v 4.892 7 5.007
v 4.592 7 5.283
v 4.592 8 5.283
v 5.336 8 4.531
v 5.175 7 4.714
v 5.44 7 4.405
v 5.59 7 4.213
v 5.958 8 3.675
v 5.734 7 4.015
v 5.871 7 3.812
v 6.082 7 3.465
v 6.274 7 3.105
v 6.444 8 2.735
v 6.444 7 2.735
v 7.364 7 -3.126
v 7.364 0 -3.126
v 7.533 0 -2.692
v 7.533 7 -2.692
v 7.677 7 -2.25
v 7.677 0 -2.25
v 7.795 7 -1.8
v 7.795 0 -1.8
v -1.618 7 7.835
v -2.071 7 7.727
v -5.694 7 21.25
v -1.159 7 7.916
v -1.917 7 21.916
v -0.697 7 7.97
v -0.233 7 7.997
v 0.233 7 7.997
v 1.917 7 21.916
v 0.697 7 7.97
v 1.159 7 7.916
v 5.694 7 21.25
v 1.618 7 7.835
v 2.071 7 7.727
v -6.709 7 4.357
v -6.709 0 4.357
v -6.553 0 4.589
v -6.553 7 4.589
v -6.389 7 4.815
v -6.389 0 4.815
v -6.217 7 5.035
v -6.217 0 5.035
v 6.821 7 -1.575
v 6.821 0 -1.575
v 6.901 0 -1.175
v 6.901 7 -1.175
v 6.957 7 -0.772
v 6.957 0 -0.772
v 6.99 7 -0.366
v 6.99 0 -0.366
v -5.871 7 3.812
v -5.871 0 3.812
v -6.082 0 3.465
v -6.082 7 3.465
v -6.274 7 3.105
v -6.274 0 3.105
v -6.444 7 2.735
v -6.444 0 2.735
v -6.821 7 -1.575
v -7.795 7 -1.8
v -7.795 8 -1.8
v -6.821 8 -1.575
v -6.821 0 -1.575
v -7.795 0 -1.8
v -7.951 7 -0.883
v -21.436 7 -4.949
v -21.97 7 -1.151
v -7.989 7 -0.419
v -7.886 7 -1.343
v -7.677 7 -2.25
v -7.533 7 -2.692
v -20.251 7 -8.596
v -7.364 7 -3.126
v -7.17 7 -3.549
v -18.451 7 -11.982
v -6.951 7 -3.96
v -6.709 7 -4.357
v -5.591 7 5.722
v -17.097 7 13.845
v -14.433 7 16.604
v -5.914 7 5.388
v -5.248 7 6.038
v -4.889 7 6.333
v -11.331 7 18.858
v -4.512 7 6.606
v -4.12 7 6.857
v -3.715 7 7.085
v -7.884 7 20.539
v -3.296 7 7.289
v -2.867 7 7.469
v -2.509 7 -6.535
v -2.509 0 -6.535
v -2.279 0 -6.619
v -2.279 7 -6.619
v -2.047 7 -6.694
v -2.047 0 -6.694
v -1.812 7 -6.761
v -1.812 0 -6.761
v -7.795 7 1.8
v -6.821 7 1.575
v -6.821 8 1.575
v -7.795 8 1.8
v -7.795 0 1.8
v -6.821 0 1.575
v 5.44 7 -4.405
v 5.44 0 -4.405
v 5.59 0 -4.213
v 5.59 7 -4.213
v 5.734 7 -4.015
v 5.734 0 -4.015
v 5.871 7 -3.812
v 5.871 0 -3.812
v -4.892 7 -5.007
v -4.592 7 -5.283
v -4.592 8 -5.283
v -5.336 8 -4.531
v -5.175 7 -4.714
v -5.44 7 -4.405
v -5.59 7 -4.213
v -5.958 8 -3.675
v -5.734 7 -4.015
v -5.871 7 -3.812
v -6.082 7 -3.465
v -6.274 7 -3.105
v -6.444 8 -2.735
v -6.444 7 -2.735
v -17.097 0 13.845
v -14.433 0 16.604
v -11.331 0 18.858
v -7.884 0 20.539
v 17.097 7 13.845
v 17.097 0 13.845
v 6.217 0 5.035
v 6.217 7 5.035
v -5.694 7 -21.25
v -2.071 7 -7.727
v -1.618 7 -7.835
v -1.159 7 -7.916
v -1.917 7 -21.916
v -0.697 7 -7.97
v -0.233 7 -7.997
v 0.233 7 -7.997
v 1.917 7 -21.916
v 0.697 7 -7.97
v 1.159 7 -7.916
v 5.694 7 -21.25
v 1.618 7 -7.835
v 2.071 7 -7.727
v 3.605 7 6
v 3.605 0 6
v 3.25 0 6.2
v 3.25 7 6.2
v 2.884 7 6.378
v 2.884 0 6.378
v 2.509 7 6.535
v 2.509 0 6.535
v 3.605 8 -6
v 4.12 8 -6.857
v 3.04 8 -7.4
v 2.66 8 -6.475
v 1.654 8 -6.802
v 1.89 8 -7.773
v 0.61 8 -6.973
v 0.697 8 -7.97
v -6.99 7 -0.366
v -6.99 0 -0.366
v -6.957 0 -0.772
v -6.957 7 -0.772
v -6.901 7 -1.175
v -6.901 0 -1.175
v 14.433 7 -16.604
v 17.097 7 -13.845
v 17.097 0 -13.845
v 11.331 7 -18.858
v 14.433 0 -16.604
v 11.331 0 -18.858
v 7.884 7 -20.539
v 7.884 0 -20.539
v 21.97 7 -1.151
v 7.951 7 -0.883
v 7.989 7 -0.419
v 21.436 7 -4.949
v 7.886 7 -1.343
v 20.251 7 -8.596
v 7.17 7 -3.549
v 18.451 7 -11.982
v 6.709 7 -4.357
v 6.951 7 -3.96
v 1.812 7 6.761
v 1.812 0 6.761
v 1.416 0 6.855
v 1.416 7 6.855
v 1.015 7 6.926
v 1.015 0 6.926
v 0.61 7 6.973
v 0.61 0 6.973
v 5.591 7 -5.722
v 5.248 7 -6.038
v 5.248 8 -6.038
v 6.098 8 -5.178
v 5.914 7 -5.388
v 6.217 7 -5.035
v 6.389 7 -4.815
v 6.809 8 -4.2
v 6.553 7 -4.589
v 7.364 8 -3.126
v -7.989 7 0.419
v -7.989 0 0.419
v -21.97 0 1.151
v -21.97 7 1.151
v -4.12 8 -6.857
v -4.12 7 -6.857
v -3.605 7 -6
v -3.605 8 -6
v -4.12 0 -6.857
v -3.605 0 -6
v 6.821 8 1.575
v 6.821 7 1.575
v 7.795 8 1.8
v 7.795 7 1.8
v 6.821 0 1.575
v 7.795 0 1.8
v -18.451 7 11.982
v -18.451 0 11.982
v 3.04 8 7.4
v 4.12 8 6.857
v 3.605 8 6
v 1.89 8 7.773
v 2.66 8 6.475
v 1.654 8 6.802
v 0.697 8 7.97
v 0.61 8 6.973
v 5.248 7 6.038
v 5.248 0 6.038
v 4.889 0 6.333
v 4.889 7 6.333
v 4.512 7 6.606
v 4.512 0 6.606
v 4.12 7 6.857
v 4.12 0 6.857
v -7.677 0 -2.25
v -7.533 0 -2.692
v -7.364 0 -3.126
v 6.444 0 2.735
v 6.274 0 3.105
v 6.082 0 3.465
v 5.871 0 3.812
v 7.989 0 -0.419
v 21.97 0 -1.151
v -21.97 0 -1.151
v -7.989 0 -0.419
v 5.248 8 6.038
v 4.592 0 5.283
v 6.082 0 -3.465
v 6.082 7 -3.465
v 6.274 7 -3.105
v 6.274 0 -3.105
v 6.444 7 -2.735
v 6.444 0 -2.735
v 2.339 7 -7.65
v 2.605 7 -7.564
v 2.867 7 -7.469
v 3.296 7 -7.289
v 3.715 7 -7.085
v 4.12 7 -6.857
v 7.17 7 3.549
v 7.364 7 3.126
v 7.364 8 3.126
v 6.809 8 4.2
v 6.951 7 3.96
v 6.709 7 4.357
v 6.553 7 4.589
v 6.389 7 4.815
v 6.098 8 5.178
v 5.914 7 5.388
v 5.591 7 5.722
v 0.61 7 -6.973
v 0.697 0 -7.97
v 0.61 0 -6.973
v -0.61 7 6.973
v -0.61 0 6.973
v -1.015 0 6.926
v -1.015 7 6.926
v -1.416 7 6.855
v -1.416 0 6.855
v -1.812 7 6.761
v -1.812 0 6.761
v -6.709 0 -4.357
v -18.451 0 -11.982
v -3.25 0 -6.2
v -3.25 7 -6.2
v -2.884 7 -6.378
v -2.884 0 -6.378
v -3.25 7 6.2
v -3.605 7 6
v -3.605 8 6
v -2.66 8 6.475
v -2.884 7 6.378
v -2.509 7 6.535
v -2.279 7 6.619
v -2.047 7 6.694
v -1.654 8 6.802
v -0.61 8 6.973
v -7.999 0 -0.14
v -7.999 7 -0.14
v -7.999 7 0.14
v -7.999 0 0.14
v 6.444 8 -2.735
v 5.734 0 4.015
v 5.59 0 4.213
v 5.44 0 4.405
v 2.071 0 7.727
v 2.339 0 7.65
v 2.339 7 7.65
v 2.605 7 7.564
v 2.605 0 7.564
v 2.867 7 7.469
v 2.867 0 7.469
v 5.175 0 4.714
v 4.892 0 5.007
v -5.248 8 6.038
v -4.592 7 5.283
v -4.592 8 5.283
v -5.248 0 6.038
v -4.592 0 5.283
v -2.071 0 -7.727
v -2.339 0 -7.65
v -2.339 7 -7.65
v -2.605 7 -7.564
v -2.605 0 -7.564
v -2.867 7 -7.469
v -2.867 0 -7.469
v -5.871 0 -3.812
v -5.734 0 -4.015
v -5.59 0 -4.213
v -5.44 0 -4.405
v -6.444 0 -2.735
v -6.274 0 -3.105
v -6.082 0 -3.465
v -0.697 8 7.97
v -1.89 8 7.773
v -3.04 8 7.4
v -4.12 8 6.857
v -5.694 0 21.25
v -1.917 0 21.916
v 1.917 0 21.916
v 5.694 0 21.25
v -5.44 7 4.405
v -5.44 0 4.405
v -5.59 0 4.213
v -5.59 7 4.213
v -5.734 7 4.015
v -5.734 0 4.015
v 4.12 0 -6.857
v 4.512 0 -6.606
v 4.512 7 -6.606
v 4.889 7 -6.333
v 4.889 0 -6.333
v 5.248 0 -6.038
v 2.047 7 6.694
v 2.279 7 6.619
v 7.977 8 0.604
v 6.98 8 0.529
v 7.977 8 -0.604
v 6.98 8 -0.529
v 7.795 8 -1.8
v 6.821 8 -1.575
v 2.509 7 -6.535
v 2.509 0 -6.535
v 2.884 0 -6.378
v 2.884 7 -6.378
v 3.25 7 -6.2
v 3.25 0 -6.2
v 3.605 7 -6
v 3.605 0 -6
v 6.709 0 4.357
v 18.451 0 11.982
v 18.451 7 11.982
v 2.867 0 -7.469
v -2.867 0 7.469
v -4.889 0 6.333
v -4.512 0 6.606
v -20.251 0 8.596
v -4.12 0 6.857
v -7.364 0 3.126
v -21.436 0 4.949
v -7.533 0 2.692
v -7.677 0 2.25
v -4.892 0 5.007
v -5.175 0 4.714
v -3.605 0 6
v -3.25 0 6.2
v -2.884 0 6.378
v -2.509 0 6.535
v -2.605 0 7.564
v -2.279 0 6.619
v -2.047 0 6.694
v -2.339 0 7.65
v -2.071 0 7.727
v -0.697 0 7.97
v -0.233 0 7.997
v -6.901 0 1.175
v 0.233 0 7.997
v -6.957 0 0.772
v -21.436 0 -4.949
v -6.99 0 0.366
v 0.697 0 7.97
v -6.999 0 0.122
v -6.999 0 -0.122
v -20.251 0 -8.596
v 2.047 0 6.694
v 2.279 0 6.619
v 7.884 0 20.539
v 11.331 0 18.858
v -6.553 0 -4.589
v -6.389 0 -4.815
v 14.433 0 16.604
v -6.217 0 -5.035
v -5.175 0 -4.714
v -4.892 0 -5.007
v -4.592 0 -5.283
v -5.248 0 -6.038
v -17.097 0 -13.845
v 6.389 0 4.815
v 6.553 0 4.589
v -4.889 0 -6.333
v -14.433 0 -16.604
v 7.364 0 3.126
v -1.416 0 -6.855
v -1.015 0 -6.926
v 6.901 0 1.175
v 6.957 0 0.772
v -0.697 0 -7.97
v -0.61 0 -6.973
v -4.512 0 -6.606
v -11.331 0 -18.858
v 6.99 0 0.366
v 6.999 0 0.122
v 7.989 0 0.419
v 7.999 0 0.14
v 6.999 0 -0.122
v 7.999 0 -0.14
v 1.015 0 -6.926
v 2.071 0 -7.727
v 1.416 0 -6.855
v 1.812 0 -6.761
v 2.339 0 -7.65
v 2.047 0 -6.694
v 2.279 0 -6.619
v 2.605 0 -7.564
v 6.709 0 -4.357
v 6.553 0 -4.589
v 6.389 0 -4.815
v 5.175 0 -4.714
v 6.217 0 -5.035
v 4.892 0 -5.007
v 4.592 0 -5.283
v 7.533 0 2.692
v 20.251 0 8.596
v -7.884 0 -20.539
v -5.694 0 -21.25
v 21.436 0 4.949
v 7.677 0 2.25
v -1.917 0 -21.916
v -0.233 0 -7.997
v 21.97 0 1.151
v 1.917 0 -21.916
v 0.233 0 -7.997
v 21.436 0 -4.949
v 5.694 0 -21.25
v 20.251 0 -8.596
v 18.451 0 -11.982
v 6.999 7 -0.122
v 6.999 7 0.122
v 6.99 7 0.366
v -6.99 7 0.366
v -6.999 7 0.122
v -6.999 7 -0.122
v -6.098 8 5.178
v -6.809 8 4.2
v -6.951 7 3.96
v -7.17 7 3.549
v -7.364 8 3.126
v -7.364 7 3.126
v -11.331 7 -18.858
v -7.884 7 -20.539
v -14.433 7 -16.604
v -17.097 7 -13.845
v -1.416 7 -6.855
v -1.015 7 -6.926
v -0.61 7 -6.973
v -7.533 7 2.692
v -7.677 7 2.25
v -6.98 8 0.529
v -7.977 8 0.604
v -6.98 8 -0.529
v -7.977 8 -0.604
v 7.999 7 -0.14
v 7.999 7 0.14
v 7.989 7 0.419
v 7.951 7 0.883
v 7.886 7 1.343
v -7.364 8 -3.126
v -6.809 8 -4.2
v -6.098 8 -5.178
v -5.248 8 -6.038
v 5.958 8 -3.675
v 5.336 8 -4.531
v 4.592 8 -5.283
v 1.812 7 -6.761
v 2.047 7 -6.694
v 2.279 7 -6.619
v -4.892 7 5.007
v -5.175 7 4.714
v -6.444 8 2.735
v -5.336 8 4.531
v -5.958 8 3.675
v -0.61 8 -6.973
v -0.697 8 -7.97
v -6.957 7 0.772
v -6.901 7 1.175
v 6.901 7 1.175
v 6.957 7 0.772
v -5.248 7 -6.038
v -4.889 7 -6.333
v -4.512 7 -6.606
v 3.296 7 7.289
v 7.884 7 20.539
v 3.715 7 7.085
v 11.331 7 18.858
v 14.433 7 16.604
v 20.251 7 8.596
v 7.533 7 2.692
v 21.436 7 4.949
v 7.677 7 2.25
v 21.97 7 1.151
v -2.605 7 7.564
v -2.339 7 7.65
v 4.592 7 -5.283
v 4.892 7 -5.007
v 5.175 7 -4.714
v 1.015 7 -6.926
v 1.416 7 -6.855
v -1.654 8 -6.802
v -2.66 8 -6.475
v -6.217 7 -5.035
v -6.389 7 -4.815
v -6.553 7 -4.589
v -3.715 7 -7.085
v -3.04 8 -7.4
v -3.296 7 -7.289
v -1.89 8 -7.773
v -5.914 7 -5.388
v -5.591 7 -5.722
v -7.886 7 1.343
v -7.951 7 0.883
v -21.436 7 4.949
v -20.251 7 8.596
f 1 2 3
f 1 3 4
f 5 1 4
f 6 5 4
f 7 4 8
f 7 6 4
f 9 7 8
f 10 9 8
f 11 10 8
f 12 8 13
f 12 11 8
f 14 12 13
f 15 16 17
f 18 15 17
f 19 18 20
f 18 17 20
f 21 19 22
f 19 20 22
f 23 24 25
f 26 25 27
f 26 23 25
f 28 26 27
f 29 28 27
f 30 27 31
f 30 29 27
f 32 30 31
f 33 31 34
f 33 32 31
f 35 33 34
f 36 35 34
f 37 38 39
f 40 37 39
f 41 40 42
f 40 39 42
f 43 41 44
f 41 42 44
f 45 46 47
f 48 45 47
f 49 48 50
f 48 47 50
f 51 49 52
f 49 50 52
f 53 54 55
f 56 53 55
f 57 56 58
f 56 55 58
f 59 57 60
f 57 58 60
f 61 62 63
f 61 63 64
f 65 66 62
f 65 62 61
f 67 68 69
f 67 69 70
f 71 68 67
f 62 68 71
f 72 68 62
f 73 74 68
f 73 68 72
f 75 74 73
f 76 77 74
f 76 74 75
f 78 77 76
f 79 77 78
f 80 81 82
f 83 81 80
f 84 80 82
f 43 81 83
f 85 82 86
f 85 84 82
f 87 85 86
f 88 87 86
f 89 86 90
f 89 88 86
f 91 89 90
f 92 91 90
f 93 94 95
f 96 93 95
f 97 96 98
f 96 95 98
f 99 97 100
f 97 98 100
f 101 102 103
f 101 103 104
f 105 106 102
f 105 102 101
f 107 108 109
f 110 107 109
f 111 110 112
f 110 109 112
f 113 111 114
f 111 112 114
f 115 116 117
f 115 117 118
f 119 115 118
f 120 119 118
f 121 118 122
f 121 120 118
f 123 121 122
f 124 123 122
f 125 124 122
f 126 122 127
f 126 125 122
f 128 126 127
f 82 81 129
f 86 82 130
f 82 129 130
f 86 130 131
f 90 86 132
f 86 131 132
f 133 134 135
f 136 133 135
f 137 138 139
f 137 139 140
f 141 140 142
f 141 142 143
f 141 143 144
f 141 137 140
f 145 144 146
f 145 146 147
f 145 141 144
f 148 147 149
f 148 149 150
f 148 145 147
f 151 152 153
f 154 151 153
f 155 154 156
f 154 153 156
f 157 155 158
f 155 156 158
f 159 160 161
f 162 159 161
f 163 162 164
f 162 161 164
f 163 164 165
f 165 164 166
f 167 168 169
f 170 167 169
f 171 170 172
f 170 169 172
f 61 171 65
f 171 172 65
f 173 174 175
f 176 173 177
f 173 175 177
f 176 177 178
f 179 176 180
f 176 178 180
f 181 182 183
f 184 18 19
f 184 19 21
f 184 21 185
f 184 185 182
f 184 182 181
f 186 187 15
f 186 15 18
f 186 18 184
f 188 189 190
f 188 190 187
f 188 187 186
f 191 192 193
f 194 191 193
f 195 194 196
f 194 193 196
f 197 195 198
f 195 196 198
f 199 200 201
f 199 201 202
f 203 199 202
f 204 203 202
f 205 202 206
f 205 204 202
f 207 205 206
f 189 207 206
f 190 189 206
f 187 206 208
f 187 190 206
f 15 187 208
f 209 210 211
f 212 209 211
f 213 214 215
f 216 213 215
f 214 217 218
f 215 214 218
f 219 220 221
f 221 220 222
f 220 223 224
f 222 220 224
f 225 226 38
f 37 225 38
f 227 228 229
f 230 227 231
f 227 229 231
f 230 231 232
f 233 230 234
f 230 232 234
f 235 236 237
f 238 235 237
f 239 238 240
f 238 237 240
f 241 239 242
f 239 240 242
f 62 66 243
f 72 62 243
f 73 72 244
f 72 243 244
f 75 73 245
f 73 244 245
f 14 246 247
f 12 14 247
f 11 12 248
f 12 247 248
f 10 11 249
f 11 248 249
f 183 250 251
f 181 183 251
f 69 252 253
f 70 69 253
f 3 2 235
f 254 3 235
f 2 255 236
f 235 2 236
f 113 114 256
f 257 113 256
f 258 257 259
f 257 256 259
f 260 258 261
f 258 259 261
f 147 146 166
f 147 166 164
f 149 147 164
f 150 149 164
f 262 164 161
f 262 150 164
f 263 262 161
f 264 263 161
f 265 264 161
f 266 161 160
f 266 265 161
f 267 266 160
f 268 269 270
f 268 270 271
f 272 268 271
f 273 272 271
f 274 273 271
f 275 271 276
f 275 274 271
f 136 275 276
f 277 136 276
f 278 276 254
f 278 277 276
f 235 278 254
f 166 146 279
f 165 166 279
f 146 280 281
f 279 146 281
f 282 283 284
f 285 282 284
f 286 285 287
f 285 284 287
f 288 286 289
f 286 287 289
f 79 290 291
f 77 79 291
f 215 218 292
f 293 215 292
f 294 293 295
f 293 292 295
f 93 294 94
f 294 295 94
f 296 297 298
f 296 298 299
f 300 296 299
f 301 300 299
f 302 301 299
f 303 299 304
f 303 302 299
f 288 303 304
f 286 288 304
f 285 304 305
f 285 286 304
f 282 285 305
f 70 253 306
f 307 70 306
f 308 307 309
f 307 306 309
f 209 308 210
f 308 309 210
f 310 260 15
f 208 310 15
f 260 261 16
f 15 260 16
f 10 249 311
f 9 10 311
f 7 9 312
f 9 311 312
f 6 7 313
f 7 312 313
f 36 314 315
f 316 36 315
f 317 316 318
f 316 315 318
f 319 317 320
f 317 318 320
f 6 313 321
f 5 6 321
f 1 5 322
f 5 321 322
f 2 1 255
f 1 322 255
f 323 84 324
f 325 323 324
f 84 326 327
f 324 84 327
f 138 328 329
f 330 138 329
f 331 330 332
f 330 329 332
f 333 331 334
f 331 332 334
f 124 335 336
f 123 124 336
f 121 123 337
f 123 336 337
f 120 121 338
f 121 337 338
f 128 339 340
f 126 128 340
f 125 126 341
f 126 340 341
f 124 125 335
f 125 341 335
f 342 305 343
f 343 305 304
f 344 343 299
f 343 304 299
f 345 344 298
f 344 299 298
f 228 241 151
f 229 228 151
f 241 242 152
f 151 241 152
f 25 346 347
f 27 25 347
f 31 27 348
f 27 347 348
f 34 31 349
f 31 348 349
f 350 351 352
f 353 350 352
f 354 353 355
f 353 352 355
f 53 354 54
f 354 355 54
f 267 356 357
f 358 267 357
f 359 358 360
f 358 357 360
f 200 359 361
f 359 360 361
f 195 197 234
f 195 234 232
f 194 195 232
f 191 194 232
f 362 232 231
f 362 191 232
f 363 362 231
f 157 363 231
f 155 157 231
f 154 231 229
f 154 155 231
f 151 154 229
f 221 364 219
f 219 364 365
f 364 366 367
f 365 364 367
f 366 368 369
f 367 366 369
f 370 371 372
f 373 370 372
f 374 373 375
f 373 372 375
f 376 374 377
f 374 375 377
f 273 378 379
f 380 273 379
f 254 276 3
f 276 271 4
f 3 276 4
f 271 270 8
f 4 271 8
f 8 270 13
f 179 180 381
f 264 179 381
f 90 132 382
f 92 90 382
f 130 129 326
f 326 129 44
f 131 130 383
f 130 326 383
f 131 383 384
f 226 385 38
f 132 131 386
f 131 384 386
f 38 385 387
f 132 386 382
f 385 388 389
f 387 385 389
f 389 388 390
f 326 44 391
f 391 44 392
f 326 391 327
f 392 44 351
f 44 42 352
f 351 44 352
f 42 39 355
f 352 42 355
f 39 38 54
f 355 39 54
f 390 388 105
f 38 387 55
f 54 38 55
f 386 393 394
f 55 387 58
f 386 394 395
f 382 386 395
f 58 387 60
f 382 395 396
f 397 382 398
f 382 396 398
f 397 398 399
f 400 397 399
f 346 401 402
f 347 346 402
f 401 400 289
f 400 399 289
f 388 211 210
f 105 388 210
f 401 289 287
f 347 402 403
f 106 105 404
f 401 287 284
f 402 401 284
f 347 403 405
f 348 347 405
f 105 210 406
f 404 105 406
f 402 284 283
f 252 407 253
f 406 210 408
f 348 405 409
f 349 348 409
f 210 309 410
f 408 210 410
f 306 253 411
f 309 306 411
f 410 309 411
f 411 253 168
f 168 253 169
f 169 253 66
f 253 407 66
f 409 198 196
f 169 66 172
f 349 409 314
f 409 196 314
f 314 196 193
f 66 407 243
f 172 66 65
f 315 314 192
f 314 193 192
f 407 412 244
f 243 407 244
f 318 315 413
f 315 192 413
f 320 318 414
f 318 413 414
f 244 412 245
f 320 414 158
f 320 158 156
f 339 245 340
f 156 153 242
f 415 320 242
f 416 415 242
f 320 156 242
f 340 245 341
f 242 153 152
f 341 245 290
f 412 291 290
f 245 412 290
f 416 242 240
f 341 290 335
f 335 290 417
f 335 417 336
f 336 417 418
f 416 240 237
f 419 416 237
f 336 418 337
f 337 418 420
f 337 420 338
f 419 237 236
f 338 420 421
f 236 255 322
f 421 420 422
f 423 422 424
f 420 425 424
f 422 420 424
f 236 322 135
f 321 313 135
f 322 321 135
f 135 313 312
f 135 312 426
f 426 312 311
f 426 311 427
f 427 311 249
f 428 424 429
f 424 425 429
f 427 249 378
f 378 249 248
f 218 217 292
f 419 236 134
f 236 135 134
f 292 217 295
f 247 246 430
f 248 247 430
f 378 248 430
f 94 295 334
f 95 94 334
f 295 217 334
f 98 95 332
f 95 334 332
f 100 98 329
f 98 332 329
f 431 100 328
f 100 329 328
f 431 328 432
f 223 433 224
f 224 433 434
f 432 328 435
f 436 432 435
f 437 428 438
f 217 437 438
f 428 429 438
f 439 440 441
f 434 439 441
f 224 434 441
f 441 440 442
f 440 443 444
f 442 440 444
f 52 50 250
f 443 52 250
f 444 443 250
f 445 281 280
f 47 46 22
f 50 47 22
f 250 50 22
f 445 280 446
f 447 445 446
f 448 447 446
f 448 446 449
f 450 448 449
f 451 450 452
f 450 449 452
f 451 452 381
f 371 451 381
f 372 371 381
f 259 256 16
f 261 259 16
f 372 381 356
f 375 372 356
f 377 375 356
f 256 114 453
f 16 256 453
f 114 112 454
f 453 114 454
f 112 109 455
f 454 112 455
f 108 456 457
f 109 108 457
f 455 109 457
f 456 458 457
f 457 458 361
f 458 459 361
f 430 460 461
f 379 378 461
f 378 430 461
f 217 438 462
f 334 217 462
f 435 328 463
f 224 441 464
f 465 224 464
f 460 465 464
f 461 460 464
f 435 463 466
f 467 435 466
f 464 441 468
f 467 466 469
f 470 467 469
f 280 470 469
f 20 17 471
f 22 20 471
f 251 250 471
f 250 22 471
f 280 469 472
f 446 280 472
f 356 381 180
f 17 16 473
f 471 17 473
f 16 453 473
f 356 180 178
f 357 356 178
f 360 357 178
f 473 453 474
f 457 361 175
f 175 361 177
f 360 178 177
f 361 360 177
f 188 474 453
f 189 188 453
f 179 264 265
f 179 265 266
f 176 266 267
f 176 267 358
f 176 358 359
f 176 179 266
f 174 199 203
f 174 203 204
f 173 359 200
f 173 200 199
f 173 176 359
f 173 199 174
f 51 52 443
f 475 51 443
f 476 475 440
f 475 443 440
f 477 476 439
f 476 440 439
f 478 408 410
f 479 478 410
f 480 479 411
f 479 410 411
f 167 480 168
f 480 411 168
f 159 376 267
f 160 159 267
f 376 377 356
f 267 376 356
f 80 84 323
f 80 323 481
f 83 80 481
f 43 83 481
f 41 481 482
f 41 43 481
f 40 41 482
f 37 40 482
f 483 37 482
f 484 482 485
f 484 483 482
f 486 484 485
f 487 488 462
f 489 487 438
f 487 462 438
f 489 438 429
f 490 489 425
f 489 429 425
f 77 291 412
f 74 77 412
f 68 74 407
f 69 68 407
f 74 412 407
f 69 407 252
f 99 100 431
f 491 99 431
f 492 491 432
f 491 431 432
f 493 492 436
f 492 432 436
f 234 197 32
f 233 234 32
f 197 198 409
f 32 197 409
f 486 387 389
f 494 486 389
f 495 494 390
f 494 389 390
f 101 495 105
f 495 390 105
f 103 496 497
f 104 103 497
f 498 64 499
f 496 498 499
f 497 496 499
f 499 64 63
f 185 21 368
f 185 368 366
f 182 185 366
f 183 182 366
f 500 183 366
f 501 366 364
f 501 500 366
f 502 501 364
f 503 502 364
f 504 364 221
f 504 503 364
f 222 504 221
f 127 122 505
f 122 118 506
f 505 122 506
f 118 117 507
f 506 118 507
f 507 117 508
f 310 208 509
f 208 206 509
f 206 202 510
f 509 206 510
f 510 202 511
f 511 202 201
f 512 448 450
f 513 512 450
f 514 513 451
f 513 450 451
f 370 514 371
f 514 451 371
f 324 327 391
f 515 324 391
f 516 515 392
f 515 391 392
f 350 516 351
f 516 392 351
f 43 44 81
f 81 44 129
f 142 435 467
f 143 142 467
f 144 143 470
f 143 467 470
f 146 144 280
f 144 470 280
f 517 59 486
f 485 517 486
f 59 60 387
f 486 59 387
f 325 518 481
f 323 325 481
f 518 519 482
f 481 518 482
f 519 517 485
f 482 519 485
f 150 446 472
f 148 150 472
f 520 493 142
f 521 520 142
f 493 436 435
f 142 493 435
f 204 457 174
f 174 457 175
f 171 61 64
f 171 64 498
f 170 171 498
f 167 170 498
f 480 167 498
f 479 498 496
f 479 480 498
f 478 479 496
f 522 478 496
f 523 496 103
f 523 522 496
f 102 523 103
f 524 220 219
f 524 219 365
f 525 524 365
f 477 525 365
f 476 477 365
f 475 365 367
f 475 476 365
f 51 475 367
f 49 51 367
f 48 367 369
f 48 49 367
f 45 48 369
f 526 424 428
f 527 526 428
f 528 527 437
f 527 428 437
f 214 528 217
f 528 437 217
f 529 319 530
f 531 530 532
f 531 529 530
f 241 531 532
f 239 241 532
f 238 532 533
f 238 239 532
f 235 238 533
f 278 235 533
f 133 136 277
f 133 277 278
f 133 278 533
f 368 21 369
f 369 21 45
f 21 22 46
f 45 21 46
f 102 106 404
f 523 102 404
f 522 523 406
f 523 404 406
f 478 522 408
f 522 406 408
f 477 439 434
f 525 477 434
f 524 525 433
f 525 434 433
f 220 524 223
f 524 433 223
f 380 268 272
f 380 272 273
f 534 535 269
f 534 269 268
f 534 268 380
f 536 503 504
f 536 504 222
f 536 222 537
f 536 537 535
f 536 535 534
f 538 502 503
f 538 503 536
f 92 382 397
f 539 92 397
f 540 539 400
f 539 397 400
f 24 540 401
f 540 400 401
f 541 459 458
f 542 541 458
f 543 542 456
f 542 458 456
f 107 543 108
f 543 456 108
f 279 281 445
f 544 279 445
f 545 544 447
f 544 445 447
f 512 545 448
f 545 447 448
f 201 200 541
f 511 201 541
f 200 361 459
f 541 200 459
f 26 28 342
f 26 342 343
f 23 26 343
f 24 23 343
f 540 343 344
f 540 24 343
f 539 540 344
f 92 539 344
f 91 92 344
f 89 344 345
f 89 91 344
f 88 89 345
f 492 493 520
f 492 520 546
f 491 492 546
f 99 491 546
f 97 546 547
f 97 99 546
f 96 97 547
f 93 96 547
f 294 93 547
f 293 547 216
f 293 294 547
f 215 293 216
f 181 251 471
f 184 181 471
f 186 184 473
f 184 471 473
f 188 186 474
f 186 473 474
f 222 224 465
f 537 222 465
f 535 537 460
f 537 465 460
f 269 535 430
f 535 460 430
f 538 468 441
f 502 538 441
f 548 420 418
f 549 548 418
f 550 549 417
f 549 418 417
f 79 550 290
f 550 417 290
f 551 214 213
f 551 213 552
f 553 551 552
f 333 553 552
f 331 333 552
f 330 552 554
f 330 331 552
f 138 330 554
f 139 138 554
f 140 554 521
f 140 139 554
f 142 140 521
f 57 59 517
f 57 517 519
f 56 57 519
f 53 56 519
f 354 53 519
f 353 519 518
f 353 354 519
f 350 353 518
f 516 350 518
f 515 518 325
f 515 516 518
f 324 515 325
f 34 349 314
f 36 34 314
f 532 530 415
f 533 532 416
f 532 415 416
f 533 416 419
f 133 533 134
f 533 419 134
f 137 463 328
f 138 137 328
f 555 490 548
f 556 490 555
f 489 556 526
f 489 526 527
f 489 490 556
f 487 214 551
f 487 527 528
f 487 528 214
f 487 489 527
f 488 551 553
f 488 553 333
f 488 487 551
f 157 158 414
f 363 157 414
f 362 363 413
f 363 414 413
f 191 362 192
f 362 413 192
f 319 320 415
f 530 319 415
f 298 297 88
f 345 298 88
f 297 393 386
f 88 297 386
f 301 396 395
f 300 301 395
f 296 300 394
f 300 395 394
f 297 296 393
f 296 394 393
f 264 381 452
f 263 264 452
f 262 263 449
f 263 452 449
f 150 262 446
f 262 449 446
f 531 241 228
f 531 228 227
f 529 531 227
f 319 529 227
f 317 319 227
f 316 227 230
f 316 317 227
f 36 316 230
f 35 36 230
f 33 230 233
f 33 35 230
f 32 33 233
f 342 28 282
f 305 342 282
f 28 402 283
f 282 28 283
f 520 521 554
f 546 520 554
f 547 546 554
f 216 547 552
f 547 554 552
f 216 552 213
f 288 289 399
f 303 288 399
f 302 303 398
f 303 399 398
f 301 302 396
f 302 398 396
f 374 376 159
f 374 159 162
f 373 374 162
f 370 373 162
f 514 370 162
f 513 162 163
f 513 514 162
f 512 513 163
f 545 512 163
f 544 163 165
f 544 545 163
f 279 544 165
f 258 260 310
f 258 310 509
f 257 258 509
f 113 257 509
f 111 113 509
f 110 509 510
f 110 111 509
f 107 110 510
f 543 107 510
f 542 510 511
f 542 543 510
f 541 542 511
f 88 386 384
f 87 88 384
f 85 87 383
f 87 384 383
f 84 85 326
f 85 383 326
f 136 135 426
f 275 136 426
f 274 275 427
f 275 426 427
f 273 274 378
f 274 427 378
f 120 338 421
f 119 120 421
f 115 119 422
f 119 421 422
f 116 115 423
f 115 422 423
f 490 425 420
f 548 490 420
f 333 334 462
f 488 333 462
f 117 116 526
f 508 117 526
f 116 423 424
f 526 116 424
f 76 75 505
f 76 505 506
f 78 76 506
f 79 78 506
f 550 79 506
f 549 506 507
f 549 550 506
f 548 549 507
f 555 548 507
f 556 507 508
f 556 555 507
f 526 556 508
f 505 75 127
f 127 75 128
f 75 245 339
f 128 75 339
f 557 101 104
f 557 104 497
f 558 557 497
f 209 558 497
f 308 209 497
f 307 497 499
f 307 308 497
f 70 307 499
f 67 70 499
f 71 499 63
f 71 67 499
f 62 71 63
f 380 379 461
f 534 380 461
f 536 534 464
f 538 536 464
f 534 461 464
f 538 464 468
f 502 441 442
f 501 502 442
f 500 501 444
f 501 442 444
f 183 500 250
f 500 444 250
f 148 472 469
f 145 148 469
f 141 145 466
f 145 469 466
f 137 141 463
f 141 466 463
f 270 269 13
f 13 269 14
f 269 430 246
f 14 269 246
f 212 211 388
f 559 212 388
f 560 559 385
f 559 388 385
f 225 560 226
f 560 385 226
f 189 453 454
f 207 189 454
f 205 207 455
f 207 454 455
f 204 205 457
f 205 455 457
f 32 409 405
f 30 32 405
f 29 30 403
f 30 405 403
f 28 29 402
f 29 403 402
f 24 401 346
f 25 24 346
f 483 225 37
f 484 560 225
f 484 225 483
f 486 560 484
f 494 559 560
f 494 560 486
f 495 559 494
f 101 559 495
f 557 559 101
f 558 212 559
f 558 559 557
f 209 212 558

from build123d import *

# Parameters (mm, degrees)
BOSS_EXTRUDE1_DEPTH = 7
BOSS_EXTRUDE2_DEPTH = 1


with BuildPart() as part:
    # Sketch2 → Boss-Extrude1 (new body)
    with BuildSketch(Plane(origin=(0, 0, 0), x_dir=(1, 0, 0), z_dir=(0, 1, 0))):
        with BuildLine():
            ThreePointArc((5.694018992, 21.250368178), (0, 22), (-5.694018992, 21.250368178))
            Line((-5.694018992, 21.250368178), (-2.070552361, 7.72740661))
            ThreePointArc((-2.070552361, 7.72740661), (-2.472135955, 7.60845213), (-2.866943596, 7.468643412))
            Line((-2.866943596, 7.468643412), (-7.88409489, 20.538769383))
            ThreePointArc((-7.88409489, 20.538769383), (-12.93127555, 17.798373876), (-17.097211152, 13.845048603))
            Line((-17.097211152, 13.845048603), (-6.217167692, 5.034563128))
            ThreePointArc((-6.217167692, 5.034563128), (-6.472135955, 4.702282018), (-6.709364544, 4.35711228))
            Line((-6.709364544, 4.35711228), (-18.450752495, 11.98205877))
            ThreePointArc((-18.450752495, 11.98205877), (-20.923243358, 6.798373876), (-21.969849765, 1.151391037))
            Line((-21.969849765, 1.151391037), (-7.989036278, 0.41868765))
            ThreePointArc((-7.989036278, 0.41868765), (-8, 0), (-7.989036278, -0.41868765))
            Line((-7.989036278, -0.41868765), (-21.969849765, -1.151391037))
            ThreePointArc((-21.969849765, -1.151391037), (-20.923243358, -6.798373876), (-18.450752495, -11.98205877))
            Line((-18.450752495, -11.98205877), (-6.709364544, -4.35711228))
            ThreePointArc((-6.709364544, -4.35711228), (-6.472135955, -4.702282018), (-6.217167692, -5.034563128))
            Line((-6.217167692, -5.034563128), (-17.097211152, -13.845048603))
            ThreePointArc((-17.097211152, -13.845048603), (-12.93127555, -17.798373876), (-7.88409489, -20.538769383))
            Line((-7.88409489, -20.538769383), (-2.866943596, -7.468643412))
            ThreePointArc((-2.866943596, -7.468643412), (-2.472135955, -7.60845213), (-2.070552361, -7.72740661))
            Line((-2.070552361, -7.72740661), (-5.694018992, -21.250368178))
            ThreePointArc((-5.694018992, -21.250368178), (0, -22), (5.694018992, -21.250368178))
            Line((5.694018992, -21.250368178), (2.070552361, -7.72740661))
            ThreePointArc((2.070552361, -7.72740661), (2.472135955, -7.60845213), (2.866943596, -7.468643412))
            Line((2.866943596, -7.468643412), (7.88409489, -20.538769383))
            ThreePointArc((7.88409489, -20.538769383), (12.93127555, -17.798373876), (17.097211152, -13.845048603))
            Line((17.097211152, -13.845048603), (6.217167692, -5.034563128))
            ThreePointArc((6.217167692, -5.034563128), (6.472135955, -4.702282018), (6.709364544, -4.35711228))
            Line((6.709364544, -4.35711228), (18.450752495, -11.98205877))
            ThreePointArc((18.450752495, -11.98205877), (20.923243358, -6.798373876), (21.969849765, -1.151391037))
            Line((21.969849765, -1.151391037), (7.989036278, -0.41868765))
            ThreePointArc((7.989036278, -0.41868765), (8, 0), (7.989036278, 0.41868765))
            Line((7.989036278, 0.41868765), (21.969849765, 1.151391037))
            ThreePointArc((21.969849765, 1.151391037), (20.923243358, 6.798373876), (18.450752495, 11.98205877))
            Line((18.450752495, 11.98205877), (6.709364544, 4.35711228))
            ThreePointArc((6.709364544, 4.35711228), (6.472135955, 4.702282018), (6.217167692, 5.034563128))
            Line((6.217167692, 5.034563128), (17.097211152, 13.845048603))
            ThreePointArc((17.097211152, 13.845048603), (12.93127555, 17.798373876), (7.88409489, 20.538769383))
            Line((7.88409489, 20.538769383), (2.866943596, 7.468643412))
            ThreePointArc((2.866943596, 7.468643412), (2.472135955, 7.60845213), (2.070552361, 7.72740661))
            Line((2.070552361, 7.72740661), (5.694018992, 21.250368178))
        make_face()
        with BuildLine():
            Line((0.697245942, 7.969557585), (0.610090199, 6.973362887))
            ThreePointArc((0.610090199, 6.973362887), (1.215537244, 6.893654271), (1.811733316, 6.761480784))
            ThreePointArc((1.811733316, 6.761480784), (2.163118961, 6.657395614), (2.508575647, 6.535062985))
            ThreePointArc((2.508575647, 6.535062985), (3.068598028, 6.291558324), (3.605266524, 6.000171105))
            Line((3.605266524, 6.000171105), (4.120304599, 6.857338406))
            ThreePointArc((4.120304599, 6.857338406), (4.702282018, 6.472135955), (5.248472232, 6.037676642))
            Line((5.248472232, 6.037676642), (4.592413203, 5.282967062))
            ThreePointArc((4.592413203, 5.282967062), (5.035378602, 4.862608593), (5.44002173, 4.405242737))
            ThreePointArc((5.44002173, 4.405242737), (5.663118961, 4.114496766), (5.870693976, 3.812473245))
            ThreePointArc((5.870693976, 3.812473245), (6.18063315, 3.28630094), (6.443533974, 2.735117899))
            Line((6.443533974, 2.735117899), (7.364038828, 3.125849028))
            ThreePointArc((7.364038828, 3.125849028), (7.60845213, 2.472135955), (7.794960518, 1.799608435))
            Line((7.794960518, 1.799608435), (6.820590453, 1.57465738))
            ThreePointArc((6.820590453, 1.57465738), (6.931876481, 0.974211707), (6.990406743, 0.366351694))
            ThreePointArc((6.990406743, 0.366351694), (7, 0), (6.990406743, -0.366351694))
            ThreePointArc((6.990406743, -0.366351694), (6.931876481, -0.974211707), (6.820590453, -1.57465738))
            Line((6.820590453, -1.57465738), (7.794960518, -1.799608435))
            ThreePointArc((7.794960518, -1.799608435), (7.60845213, -2.472135955), (7.364038828, -3.125849028))
            Line((7.364038828, -3.125849028), (6.443533974, -2.735117899))
            ThreePointArc((6.443533974, -2.735117899), (6.18063315, -3.28630094), (5.870693976, -3.812473245))
            ThreePointArc((5.870693976, -3.812473245), (5.663118961, -4.114496766), (5.44002173, -4.405242737))
            ThreePointArc((5.44002173, -4.405242737), (5.035378602, -4.862608593), (4.592413203, -5.282967062))
            Line((4.592413203, -5.282967062), (5.248472232, -6.037676642))
            ThreePointArc((5.248472232, -6.037676642), (4.702282018, -6.472135955), (4.120304599, -6.857338406))
            Line((4.120304599, -6.857338406), (3.605266524, -6.000171105))
            ThreePointArc((3.605266524, -6.000171105), (3.068598028, -6.291558324), (2.508575647, -6.535062985))
            ThreePointArc((2.508575647, -6.535062985), (2.163118961, -6.657395614), (1.811733316, -6.761480784))
            ThreePointArc((1.811733316, -6.761480784), (1.215537244, -6.893654271), (0.610090199, -6.973362887))
            Line((0.610090199, -6.973362887), (0.697245942, -7.969557585))
            ThreePointArc((0.697245942, -7.969557585), (0, -8), (-0.697245942, -7.969557585))
            Line((-0.697245942, -7.969557585), (-0.610090199, -6.973362887))
            ThreePointArc((-0.610090199, -6.973362887), (-1.215537244, -6.893654271), (-1.811733316, -6.761480784))
            ThreePointArc((-1.811733316, -6.761480784), (-2.163118961, -6.657395614), (-2.508575647, -6.535062985))
            ThreePointArc((-2.508575647, -6.535062985), (-3.068598028, -6.291558324), (-3.605266524, -6.000171105))
            Line((-3.605266524, -6.000171105), (-4.120304599, -6.857338406))
            ThreePointArc((-4.120304599, -6.857338406), (-4.702282018, -6.472135955), (-5.248472232, -6.037676642))
            Line((-5.248472232, -6.037676642), (-4.592413203, -5.282967062))
            ThreePointArc((-4.592413203, -5.282967062), (-5.035378602, -4.862608593), (-5.44002173, -4.405242737))
            ThreePointArc((-5.44002173, -4.405242737), (-5.663118961, -4.114496766), (-5.870693976, -3.812473245))
            ThreePointArc((-5.870693976, -3.812473245), (-6.18063315, -3.28630094), (-6.443533974, -2.735117899))
            Line((-6.443533974, -2.735117899), (-7.364038828, -3.125849028))
            ThreePointArc((-7.364038828, -3.125849028), (-7.60845213, -2.472135955), (-7.794960518, -1.799608435))
            Line((-7.794960518, -1.799608435), (-6.820590453, -1.57465738))
            ThreePointArc((-6.820590453, -1.57465738), (-6.931876481, -0.974211707), (-6.990406743, -0.366351694))
            ThreePointArc((-6.990406743, -0.366351694), (-7, 0), (-6.990406743, 0.366351694))
            ThreePointArc((-6.990406743, 0.366351694), (-6.931876481, 0.974211707), (-6.820590453, 1.57465738))
            Line((-6.820590453, 1.57465738), (-7.794960518, 1.799608435))
            ThreePointArc((-7.794960518, 1.799608435), (-7.60845213, 2.472135955), (-7.364038828, 3.125849028))
            Line((-7.364038828, 3.125849028), (-6.443533974, 2.735117899))
            ThreePointArc((-6.443533974, 2.735117899), (-6.18063315, 3.28630094), (-5.870693976, 3.812473245))
            ThreePointArc((-5.870693976, 3.812473245), (-5.663118961, 4.114496766), (-5.44002173, 4.405242737))
            ThreePointArc((-5.44002173, 4.405242737), (-5.035378602, 4.862608593), (-4.592413203, 5.282967062))
            Line((-4.592413203, 5.282967062), (-5.248472232, 6.037676642))
            ThreePointArc((-5.248472232, 6.037676642), (-4.702282018, 6.472135955), (-4.120304599, 6.857338406))
            Line((-4.120304599, 6.857338406), (-3.605266524, 6.000171105))
            ThreePointArc((-3.605266524, 6.000171105), (-3.068598028, 6.291558324), (-2.508575647, 6.535062985))
            ThreePointArc((-2.508575647, 6.535062985), (-2.163118961, 6.657395614), (-1.811733316, 6.761480784))
            ThreePointArc((-1.811733316, 6.761480784), (-1.215537244, 6.893654271), (-0.610090199, 6.973362887))
            Line((-0.610090199, 6.973362887), (-0.697245942, 7.969557585))
            ThreePointArc((-0.697245942, 7.969557585), (0, 8), (0.697245942, 7.969557585))
        make_face(mode=Mode.SUBTRACT)
    extrude(amount=BOSS_EXTRUDE1_DEPTH)

    # Sketch3 → Boss-Extrude2 (add)
    with BuildSketch(Plane(origin=(0, 7, 0), x_dir=(1, 0, 0), z_dir=(0, 1, 0))):
        with BuildLine():
            Line((-7.794960518, 1.799608435), (-6.820590453, 1.57465738))
            ThreePointArc((-6.820590453, 1.57465738), (-7, 0), (-6.820590453, -1.57465738))
            Line((-6.820590453, -1.57465738), (-7.794960518, -1.799608435))
            ThreePointArc((-7.794960518, -1.799608435), (-8, 0), (-7.794960518, 1.799608435))
        make_face()
        with BuildLine():
            Line((-7.364038828, -3.125849028), (-6.443533974, -2.735117899))
            ThreePointArc((-6.443533974, -2.735117899), (-5.663118961, -4.114496766), (-4.592413203, -5.282967062))
            Line((-4.592413203, -5.282967062), (-5.248472232, -6.037676642))
            ThreePointArc((-5.248472232, -6.037676642), (-6.472135955, -4.702282018), (-7.364038828, -3.125849028))
        make_face()
        with BuildLine():
            Line((-4.120304599, -6.857338406), (-3.605266524, -6.000171105))
            ThreePointArc((-3.605266524, -6.000171105), (-2.163118961, -6.657395614), (-0.610090199, -6.973362887))
            Line((-0.610090199, -6.973362887), (-0.697245942, -7.969557585))
            ThreePointArc((-0.697245942, -7.969557585), (-2.472135955, -7.60845213), (-4.120304599, -6.857338406))
        make_face()
        with BuildLine():
            Line((0.697245942, -7.969557585), (0.610090199, -6.973362887))
            ThreePointArc((0.610090199, -6.973362887), (2.163118961, -6.657395614), (3.605266524, -6.000171105))
            Line((3.605266524, -6.000171105), (4.120304599, -6.857338406))
            ThreePointArc((4.120304599, -6.857338406), (2.472135955, -7.60845213), (0.697245942, -7.969557585))
        make_face()
        with BuildLine():
            Line((5.248472232, -6.037676642), (4.592413203, -5.282967062))
            ThreePointArc((4.592413203, -5.282967062), (5.663118961, -4.114496766), (6.443533974, -2.735117899))
            Line((6.443533974, -2.735117899), (7.364038828, -3.125849028))
            ThreePointArc((7.364038828, -3.125849028), (6.472135955, -4.702282018), (5.248472232, -6.037676642))
        make_face()
        with BuildLine():
            Line((7.794960518, -1.799608435), (6.820590453, -1.57465738))
            ThreePointArc((6.820590453, -1.57465738), (7, 0), (6.820590453, 1.57465738))
            Line((6.820590453, 1.57465738), (7.794960518, 1.799608435))
            ThreePointArc((7.794960518, 1.799608435), (8, 0), (7.794960518, -1.799608435))
        make_face()
        with BuildLine():
            Line((7.364038828, 3.125849028), (6.443533974, 2.735117899))
            ThreePointArc((6.443533974, 2.735117899), (5.663118961, 4.114496766), (4.592413203, 5.282967062))
            Line((4.592413203, 5.282967062), (5.248472232, 6.037676642))
            ThreePointArc((5.248472232, 6.037676642), (6.472135955, 4.702282018), (7.364038828, 3.125849028))
        make_face()
        with BuildLine():
            Line((4.120304599, 6.857338406), (3.605266524, 6.000171105))
            ThreePointArc((3.605266524, 6.000171105), (2.163118961, 6.657395614), (0.610090199, 6.973362887))
            Line((0.610090199, 6.973362887), (0.697245942, 7.969557585))
            ThreePointArc((0.697245942, 7.969557585), (2.472135955, 7.60845213), (4.120304599, 6.857338406))
        make_face()
        with BuildLine():
            Line((-0.697245942, 7.969557585), (-0.610090199, 6.973362887))
            ThreePointArc((-0.610090199, 6.973362887), (-2.163118961, 6.657395614), (-3.605266524, 6.000171105))
            Line((-3.605266524, 6.000171105), (-4.120304599, 6.857338406))
            ThreePointArc((-4.120304599, 6.857338406), (-2.472135955, 7.60845213), (-0.697245942, 7.969557585))
        make_face()
        with BuildLine():
            Line((-5.248472232, 6.037676642), (-4.592413203, 5.282967062))
            ThreePointArc((-4.592413203, 5.282967062), (-5.663118961, 4.114496766), (-6.443533974, 2.735117899))
            Line((-6.443533974, 2.735117899), (-7.364038828, 3.125849028))
            ThreePointArc((-7.364038828, 3.125849028), (-6.472135955, 4.702282018), (-5.248472232, 6.037676642))
        make_face()
    extrude(amount=BOSS_EXTRUDE2_DEPTH)


solid = part.part
